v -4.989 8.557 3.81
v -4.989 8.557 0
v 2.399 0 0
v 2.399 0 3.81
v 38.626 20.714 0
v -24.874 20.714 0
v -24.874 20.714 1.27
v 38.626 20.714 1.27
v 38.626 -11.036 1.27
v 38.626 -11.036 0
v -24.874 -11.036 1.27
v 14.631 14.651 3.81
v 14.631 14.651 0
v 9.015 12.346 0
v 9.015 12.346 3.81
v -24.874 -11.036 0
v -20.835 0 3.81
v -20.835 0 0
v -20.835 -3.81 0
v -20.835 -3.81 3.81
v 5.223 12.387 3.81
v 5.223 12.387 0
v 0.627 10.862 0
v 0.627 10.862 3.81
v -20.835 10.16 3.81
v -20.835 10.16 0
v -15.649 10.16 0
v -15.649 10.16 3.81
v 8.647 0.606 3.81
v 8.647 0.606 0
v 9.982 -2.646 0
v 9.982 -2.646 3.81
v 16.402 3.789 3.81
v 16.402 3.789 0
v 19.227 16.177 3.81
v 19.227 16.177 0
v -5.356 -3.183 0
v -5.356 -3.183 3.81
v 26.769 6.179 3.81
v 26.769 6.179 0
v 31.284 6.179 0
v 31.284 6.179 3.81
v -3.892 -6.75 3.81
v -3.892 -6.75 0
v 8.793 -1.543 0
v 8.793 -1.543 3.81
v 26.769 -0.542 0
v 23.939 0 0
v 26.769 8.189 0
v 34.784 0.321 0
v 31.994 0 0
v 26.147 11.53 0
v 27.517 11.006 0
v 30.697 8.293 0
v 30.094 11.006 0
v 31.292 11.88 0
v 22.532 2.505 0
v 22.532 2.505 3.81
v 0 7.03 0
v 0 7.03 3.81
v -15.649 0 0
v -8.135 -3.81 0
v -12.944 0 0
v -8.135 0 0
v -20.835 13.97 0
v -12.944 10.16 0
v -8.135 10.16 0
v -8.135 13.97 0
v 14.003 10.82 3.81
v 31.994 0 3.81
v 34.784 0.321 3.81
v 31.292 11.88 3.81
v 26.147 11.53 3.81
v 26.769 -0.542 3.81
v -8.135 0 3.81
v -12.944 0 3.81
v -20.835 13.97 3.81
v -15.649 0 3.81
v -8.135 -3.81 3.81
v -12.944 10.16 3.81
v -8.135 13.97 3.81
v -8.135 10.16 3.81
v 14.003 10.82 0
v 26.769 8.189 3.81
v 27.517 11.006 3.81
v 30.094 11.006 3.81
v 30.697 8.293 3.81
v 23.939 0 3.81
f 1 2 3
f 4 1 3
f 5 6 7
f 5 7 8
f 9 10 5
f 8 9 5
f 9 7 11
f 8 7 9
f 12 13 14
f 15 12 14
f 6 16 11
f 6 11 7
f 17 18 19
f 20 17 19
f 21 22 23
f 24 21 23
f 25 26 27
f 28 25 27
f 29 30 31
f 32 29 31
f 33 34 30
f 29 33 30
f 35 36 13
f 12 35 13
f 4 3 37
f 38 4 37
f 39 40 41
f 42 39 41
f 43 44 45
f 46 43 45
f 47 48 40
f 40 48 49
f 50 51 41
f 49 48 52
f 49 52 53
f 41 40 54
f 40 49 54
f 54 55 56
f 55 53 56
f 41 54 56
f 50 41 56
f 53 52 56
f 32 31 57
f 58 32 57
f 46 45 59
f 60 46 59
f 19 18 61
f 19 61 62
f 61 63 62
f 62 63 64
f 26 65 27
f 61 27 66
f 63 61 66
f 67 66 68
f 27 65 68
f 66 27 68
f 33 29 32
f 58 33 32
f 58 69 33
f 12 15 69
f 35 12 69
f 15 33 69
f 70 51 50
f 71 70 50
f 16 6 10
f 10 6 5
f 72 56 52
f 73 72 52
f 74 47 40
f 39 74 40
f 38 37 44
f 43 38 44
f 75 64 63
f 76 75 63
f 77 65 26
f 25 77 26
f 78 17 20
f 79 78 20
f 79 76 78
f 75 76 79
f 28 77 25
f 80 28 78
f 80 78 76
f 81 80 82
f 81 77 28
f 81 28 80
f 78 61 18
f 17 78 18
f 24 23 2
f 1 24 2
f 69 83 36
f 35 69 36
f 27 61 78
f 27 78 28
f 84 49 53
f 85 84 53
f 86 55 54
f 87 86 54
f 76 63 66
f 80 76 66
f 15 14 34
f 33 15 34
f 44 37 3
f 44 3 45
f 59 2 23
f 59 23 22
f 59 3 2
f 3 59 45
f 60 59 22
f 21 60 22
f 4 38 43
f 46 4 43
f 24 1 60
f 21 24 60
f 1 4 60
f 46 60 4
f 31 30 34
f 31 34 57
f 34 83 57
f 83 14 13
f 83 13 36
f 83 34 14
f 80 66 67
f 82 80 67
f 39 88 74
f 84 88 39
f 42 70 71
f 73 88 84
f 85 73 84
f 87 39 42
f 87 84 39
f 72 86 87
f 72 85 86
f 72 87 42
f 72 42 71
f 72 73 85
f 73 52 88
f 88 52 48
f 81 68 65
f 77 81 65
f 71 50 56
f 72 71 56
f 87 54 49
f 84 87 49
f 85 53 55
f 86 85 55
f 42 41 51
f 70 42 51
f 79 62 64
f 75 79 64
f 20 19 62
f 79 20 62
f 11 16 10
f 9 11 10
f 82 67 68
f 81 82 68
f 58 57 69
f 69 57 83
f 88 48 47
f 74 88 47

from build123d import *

# Parameters (mm, degrees)
F0_W     = 2.705607
F0_H     = 10.16
F1_DEPTH = 3.81
F2_W     = 63.5
F2_H     = 31.75
F3_DEPTH = 1.27


with BuildPart() as f1:
    # F0 (on Top) → F1 (new body)
    with BuildSketch(Plane.XY):
        Polygon((-20.835026, 10.16), (-15.649381, 10.16), (-12.943774, 10.16), (-8.135026, 10.16), (-8.135026, 13.97), (-20.835026, 13.97), align=None)
        with Locations((-14.296577, 5.08)):
            Rectangle(F0_W, F0_H)
        Polygon((-12.943774, 0), (-15.649381, 0), (-20.835026, 0), (-20.835026, -3.81), (-8.135026, -3.81), (-8.135026, 0), align=None)
        Polygon((5.223219, 12.387373), (0.627128, 10.861921), (-4.988946, 8.556758), (2.39897, 0), (-5.356256, -3.183195), (-3.892129, -6.75025), (8.793328, -1.543402), (0, 7.030444), align=None)
        Polygon((19.226712, 16.176651), (14.630621, 14.651199), (9.014547, 12.346036), (16.402463, 3.789278), (8.647237, 0.606083), (9.982238, -2.646384), (22.53151, 2.504566), (14.003493, 10.819722), align=None)
        Polygon((31.291671, 11.87978), (26.147099, 11.52967), (23.939183, 0), (26.769016, -0.541909), (26.769016, 6.178938), (31.28387, 6.178938), (31.994306, 0), (34.784245, 0.320779), align=None)
        Polygon((30.696951, 8.292786), (26.769016, 8.189108), (27.517159, 11.005629), (30.09356, 11.005629), align=None, mode=Mode.SUBTRACT)
    extrude(amount=F1_DEPTH)


with BuildPart() as f3:
    # F2 (on Top) → F3 (new body)
    with BuildSketch(Plane.XY):
        with Locations((6.87552, 4.839138)):
            Rectangle(F2_W, F2_H)
    extrude(amount=F3_DEPTH)


solid = Compound([f1.part, f3.part])
